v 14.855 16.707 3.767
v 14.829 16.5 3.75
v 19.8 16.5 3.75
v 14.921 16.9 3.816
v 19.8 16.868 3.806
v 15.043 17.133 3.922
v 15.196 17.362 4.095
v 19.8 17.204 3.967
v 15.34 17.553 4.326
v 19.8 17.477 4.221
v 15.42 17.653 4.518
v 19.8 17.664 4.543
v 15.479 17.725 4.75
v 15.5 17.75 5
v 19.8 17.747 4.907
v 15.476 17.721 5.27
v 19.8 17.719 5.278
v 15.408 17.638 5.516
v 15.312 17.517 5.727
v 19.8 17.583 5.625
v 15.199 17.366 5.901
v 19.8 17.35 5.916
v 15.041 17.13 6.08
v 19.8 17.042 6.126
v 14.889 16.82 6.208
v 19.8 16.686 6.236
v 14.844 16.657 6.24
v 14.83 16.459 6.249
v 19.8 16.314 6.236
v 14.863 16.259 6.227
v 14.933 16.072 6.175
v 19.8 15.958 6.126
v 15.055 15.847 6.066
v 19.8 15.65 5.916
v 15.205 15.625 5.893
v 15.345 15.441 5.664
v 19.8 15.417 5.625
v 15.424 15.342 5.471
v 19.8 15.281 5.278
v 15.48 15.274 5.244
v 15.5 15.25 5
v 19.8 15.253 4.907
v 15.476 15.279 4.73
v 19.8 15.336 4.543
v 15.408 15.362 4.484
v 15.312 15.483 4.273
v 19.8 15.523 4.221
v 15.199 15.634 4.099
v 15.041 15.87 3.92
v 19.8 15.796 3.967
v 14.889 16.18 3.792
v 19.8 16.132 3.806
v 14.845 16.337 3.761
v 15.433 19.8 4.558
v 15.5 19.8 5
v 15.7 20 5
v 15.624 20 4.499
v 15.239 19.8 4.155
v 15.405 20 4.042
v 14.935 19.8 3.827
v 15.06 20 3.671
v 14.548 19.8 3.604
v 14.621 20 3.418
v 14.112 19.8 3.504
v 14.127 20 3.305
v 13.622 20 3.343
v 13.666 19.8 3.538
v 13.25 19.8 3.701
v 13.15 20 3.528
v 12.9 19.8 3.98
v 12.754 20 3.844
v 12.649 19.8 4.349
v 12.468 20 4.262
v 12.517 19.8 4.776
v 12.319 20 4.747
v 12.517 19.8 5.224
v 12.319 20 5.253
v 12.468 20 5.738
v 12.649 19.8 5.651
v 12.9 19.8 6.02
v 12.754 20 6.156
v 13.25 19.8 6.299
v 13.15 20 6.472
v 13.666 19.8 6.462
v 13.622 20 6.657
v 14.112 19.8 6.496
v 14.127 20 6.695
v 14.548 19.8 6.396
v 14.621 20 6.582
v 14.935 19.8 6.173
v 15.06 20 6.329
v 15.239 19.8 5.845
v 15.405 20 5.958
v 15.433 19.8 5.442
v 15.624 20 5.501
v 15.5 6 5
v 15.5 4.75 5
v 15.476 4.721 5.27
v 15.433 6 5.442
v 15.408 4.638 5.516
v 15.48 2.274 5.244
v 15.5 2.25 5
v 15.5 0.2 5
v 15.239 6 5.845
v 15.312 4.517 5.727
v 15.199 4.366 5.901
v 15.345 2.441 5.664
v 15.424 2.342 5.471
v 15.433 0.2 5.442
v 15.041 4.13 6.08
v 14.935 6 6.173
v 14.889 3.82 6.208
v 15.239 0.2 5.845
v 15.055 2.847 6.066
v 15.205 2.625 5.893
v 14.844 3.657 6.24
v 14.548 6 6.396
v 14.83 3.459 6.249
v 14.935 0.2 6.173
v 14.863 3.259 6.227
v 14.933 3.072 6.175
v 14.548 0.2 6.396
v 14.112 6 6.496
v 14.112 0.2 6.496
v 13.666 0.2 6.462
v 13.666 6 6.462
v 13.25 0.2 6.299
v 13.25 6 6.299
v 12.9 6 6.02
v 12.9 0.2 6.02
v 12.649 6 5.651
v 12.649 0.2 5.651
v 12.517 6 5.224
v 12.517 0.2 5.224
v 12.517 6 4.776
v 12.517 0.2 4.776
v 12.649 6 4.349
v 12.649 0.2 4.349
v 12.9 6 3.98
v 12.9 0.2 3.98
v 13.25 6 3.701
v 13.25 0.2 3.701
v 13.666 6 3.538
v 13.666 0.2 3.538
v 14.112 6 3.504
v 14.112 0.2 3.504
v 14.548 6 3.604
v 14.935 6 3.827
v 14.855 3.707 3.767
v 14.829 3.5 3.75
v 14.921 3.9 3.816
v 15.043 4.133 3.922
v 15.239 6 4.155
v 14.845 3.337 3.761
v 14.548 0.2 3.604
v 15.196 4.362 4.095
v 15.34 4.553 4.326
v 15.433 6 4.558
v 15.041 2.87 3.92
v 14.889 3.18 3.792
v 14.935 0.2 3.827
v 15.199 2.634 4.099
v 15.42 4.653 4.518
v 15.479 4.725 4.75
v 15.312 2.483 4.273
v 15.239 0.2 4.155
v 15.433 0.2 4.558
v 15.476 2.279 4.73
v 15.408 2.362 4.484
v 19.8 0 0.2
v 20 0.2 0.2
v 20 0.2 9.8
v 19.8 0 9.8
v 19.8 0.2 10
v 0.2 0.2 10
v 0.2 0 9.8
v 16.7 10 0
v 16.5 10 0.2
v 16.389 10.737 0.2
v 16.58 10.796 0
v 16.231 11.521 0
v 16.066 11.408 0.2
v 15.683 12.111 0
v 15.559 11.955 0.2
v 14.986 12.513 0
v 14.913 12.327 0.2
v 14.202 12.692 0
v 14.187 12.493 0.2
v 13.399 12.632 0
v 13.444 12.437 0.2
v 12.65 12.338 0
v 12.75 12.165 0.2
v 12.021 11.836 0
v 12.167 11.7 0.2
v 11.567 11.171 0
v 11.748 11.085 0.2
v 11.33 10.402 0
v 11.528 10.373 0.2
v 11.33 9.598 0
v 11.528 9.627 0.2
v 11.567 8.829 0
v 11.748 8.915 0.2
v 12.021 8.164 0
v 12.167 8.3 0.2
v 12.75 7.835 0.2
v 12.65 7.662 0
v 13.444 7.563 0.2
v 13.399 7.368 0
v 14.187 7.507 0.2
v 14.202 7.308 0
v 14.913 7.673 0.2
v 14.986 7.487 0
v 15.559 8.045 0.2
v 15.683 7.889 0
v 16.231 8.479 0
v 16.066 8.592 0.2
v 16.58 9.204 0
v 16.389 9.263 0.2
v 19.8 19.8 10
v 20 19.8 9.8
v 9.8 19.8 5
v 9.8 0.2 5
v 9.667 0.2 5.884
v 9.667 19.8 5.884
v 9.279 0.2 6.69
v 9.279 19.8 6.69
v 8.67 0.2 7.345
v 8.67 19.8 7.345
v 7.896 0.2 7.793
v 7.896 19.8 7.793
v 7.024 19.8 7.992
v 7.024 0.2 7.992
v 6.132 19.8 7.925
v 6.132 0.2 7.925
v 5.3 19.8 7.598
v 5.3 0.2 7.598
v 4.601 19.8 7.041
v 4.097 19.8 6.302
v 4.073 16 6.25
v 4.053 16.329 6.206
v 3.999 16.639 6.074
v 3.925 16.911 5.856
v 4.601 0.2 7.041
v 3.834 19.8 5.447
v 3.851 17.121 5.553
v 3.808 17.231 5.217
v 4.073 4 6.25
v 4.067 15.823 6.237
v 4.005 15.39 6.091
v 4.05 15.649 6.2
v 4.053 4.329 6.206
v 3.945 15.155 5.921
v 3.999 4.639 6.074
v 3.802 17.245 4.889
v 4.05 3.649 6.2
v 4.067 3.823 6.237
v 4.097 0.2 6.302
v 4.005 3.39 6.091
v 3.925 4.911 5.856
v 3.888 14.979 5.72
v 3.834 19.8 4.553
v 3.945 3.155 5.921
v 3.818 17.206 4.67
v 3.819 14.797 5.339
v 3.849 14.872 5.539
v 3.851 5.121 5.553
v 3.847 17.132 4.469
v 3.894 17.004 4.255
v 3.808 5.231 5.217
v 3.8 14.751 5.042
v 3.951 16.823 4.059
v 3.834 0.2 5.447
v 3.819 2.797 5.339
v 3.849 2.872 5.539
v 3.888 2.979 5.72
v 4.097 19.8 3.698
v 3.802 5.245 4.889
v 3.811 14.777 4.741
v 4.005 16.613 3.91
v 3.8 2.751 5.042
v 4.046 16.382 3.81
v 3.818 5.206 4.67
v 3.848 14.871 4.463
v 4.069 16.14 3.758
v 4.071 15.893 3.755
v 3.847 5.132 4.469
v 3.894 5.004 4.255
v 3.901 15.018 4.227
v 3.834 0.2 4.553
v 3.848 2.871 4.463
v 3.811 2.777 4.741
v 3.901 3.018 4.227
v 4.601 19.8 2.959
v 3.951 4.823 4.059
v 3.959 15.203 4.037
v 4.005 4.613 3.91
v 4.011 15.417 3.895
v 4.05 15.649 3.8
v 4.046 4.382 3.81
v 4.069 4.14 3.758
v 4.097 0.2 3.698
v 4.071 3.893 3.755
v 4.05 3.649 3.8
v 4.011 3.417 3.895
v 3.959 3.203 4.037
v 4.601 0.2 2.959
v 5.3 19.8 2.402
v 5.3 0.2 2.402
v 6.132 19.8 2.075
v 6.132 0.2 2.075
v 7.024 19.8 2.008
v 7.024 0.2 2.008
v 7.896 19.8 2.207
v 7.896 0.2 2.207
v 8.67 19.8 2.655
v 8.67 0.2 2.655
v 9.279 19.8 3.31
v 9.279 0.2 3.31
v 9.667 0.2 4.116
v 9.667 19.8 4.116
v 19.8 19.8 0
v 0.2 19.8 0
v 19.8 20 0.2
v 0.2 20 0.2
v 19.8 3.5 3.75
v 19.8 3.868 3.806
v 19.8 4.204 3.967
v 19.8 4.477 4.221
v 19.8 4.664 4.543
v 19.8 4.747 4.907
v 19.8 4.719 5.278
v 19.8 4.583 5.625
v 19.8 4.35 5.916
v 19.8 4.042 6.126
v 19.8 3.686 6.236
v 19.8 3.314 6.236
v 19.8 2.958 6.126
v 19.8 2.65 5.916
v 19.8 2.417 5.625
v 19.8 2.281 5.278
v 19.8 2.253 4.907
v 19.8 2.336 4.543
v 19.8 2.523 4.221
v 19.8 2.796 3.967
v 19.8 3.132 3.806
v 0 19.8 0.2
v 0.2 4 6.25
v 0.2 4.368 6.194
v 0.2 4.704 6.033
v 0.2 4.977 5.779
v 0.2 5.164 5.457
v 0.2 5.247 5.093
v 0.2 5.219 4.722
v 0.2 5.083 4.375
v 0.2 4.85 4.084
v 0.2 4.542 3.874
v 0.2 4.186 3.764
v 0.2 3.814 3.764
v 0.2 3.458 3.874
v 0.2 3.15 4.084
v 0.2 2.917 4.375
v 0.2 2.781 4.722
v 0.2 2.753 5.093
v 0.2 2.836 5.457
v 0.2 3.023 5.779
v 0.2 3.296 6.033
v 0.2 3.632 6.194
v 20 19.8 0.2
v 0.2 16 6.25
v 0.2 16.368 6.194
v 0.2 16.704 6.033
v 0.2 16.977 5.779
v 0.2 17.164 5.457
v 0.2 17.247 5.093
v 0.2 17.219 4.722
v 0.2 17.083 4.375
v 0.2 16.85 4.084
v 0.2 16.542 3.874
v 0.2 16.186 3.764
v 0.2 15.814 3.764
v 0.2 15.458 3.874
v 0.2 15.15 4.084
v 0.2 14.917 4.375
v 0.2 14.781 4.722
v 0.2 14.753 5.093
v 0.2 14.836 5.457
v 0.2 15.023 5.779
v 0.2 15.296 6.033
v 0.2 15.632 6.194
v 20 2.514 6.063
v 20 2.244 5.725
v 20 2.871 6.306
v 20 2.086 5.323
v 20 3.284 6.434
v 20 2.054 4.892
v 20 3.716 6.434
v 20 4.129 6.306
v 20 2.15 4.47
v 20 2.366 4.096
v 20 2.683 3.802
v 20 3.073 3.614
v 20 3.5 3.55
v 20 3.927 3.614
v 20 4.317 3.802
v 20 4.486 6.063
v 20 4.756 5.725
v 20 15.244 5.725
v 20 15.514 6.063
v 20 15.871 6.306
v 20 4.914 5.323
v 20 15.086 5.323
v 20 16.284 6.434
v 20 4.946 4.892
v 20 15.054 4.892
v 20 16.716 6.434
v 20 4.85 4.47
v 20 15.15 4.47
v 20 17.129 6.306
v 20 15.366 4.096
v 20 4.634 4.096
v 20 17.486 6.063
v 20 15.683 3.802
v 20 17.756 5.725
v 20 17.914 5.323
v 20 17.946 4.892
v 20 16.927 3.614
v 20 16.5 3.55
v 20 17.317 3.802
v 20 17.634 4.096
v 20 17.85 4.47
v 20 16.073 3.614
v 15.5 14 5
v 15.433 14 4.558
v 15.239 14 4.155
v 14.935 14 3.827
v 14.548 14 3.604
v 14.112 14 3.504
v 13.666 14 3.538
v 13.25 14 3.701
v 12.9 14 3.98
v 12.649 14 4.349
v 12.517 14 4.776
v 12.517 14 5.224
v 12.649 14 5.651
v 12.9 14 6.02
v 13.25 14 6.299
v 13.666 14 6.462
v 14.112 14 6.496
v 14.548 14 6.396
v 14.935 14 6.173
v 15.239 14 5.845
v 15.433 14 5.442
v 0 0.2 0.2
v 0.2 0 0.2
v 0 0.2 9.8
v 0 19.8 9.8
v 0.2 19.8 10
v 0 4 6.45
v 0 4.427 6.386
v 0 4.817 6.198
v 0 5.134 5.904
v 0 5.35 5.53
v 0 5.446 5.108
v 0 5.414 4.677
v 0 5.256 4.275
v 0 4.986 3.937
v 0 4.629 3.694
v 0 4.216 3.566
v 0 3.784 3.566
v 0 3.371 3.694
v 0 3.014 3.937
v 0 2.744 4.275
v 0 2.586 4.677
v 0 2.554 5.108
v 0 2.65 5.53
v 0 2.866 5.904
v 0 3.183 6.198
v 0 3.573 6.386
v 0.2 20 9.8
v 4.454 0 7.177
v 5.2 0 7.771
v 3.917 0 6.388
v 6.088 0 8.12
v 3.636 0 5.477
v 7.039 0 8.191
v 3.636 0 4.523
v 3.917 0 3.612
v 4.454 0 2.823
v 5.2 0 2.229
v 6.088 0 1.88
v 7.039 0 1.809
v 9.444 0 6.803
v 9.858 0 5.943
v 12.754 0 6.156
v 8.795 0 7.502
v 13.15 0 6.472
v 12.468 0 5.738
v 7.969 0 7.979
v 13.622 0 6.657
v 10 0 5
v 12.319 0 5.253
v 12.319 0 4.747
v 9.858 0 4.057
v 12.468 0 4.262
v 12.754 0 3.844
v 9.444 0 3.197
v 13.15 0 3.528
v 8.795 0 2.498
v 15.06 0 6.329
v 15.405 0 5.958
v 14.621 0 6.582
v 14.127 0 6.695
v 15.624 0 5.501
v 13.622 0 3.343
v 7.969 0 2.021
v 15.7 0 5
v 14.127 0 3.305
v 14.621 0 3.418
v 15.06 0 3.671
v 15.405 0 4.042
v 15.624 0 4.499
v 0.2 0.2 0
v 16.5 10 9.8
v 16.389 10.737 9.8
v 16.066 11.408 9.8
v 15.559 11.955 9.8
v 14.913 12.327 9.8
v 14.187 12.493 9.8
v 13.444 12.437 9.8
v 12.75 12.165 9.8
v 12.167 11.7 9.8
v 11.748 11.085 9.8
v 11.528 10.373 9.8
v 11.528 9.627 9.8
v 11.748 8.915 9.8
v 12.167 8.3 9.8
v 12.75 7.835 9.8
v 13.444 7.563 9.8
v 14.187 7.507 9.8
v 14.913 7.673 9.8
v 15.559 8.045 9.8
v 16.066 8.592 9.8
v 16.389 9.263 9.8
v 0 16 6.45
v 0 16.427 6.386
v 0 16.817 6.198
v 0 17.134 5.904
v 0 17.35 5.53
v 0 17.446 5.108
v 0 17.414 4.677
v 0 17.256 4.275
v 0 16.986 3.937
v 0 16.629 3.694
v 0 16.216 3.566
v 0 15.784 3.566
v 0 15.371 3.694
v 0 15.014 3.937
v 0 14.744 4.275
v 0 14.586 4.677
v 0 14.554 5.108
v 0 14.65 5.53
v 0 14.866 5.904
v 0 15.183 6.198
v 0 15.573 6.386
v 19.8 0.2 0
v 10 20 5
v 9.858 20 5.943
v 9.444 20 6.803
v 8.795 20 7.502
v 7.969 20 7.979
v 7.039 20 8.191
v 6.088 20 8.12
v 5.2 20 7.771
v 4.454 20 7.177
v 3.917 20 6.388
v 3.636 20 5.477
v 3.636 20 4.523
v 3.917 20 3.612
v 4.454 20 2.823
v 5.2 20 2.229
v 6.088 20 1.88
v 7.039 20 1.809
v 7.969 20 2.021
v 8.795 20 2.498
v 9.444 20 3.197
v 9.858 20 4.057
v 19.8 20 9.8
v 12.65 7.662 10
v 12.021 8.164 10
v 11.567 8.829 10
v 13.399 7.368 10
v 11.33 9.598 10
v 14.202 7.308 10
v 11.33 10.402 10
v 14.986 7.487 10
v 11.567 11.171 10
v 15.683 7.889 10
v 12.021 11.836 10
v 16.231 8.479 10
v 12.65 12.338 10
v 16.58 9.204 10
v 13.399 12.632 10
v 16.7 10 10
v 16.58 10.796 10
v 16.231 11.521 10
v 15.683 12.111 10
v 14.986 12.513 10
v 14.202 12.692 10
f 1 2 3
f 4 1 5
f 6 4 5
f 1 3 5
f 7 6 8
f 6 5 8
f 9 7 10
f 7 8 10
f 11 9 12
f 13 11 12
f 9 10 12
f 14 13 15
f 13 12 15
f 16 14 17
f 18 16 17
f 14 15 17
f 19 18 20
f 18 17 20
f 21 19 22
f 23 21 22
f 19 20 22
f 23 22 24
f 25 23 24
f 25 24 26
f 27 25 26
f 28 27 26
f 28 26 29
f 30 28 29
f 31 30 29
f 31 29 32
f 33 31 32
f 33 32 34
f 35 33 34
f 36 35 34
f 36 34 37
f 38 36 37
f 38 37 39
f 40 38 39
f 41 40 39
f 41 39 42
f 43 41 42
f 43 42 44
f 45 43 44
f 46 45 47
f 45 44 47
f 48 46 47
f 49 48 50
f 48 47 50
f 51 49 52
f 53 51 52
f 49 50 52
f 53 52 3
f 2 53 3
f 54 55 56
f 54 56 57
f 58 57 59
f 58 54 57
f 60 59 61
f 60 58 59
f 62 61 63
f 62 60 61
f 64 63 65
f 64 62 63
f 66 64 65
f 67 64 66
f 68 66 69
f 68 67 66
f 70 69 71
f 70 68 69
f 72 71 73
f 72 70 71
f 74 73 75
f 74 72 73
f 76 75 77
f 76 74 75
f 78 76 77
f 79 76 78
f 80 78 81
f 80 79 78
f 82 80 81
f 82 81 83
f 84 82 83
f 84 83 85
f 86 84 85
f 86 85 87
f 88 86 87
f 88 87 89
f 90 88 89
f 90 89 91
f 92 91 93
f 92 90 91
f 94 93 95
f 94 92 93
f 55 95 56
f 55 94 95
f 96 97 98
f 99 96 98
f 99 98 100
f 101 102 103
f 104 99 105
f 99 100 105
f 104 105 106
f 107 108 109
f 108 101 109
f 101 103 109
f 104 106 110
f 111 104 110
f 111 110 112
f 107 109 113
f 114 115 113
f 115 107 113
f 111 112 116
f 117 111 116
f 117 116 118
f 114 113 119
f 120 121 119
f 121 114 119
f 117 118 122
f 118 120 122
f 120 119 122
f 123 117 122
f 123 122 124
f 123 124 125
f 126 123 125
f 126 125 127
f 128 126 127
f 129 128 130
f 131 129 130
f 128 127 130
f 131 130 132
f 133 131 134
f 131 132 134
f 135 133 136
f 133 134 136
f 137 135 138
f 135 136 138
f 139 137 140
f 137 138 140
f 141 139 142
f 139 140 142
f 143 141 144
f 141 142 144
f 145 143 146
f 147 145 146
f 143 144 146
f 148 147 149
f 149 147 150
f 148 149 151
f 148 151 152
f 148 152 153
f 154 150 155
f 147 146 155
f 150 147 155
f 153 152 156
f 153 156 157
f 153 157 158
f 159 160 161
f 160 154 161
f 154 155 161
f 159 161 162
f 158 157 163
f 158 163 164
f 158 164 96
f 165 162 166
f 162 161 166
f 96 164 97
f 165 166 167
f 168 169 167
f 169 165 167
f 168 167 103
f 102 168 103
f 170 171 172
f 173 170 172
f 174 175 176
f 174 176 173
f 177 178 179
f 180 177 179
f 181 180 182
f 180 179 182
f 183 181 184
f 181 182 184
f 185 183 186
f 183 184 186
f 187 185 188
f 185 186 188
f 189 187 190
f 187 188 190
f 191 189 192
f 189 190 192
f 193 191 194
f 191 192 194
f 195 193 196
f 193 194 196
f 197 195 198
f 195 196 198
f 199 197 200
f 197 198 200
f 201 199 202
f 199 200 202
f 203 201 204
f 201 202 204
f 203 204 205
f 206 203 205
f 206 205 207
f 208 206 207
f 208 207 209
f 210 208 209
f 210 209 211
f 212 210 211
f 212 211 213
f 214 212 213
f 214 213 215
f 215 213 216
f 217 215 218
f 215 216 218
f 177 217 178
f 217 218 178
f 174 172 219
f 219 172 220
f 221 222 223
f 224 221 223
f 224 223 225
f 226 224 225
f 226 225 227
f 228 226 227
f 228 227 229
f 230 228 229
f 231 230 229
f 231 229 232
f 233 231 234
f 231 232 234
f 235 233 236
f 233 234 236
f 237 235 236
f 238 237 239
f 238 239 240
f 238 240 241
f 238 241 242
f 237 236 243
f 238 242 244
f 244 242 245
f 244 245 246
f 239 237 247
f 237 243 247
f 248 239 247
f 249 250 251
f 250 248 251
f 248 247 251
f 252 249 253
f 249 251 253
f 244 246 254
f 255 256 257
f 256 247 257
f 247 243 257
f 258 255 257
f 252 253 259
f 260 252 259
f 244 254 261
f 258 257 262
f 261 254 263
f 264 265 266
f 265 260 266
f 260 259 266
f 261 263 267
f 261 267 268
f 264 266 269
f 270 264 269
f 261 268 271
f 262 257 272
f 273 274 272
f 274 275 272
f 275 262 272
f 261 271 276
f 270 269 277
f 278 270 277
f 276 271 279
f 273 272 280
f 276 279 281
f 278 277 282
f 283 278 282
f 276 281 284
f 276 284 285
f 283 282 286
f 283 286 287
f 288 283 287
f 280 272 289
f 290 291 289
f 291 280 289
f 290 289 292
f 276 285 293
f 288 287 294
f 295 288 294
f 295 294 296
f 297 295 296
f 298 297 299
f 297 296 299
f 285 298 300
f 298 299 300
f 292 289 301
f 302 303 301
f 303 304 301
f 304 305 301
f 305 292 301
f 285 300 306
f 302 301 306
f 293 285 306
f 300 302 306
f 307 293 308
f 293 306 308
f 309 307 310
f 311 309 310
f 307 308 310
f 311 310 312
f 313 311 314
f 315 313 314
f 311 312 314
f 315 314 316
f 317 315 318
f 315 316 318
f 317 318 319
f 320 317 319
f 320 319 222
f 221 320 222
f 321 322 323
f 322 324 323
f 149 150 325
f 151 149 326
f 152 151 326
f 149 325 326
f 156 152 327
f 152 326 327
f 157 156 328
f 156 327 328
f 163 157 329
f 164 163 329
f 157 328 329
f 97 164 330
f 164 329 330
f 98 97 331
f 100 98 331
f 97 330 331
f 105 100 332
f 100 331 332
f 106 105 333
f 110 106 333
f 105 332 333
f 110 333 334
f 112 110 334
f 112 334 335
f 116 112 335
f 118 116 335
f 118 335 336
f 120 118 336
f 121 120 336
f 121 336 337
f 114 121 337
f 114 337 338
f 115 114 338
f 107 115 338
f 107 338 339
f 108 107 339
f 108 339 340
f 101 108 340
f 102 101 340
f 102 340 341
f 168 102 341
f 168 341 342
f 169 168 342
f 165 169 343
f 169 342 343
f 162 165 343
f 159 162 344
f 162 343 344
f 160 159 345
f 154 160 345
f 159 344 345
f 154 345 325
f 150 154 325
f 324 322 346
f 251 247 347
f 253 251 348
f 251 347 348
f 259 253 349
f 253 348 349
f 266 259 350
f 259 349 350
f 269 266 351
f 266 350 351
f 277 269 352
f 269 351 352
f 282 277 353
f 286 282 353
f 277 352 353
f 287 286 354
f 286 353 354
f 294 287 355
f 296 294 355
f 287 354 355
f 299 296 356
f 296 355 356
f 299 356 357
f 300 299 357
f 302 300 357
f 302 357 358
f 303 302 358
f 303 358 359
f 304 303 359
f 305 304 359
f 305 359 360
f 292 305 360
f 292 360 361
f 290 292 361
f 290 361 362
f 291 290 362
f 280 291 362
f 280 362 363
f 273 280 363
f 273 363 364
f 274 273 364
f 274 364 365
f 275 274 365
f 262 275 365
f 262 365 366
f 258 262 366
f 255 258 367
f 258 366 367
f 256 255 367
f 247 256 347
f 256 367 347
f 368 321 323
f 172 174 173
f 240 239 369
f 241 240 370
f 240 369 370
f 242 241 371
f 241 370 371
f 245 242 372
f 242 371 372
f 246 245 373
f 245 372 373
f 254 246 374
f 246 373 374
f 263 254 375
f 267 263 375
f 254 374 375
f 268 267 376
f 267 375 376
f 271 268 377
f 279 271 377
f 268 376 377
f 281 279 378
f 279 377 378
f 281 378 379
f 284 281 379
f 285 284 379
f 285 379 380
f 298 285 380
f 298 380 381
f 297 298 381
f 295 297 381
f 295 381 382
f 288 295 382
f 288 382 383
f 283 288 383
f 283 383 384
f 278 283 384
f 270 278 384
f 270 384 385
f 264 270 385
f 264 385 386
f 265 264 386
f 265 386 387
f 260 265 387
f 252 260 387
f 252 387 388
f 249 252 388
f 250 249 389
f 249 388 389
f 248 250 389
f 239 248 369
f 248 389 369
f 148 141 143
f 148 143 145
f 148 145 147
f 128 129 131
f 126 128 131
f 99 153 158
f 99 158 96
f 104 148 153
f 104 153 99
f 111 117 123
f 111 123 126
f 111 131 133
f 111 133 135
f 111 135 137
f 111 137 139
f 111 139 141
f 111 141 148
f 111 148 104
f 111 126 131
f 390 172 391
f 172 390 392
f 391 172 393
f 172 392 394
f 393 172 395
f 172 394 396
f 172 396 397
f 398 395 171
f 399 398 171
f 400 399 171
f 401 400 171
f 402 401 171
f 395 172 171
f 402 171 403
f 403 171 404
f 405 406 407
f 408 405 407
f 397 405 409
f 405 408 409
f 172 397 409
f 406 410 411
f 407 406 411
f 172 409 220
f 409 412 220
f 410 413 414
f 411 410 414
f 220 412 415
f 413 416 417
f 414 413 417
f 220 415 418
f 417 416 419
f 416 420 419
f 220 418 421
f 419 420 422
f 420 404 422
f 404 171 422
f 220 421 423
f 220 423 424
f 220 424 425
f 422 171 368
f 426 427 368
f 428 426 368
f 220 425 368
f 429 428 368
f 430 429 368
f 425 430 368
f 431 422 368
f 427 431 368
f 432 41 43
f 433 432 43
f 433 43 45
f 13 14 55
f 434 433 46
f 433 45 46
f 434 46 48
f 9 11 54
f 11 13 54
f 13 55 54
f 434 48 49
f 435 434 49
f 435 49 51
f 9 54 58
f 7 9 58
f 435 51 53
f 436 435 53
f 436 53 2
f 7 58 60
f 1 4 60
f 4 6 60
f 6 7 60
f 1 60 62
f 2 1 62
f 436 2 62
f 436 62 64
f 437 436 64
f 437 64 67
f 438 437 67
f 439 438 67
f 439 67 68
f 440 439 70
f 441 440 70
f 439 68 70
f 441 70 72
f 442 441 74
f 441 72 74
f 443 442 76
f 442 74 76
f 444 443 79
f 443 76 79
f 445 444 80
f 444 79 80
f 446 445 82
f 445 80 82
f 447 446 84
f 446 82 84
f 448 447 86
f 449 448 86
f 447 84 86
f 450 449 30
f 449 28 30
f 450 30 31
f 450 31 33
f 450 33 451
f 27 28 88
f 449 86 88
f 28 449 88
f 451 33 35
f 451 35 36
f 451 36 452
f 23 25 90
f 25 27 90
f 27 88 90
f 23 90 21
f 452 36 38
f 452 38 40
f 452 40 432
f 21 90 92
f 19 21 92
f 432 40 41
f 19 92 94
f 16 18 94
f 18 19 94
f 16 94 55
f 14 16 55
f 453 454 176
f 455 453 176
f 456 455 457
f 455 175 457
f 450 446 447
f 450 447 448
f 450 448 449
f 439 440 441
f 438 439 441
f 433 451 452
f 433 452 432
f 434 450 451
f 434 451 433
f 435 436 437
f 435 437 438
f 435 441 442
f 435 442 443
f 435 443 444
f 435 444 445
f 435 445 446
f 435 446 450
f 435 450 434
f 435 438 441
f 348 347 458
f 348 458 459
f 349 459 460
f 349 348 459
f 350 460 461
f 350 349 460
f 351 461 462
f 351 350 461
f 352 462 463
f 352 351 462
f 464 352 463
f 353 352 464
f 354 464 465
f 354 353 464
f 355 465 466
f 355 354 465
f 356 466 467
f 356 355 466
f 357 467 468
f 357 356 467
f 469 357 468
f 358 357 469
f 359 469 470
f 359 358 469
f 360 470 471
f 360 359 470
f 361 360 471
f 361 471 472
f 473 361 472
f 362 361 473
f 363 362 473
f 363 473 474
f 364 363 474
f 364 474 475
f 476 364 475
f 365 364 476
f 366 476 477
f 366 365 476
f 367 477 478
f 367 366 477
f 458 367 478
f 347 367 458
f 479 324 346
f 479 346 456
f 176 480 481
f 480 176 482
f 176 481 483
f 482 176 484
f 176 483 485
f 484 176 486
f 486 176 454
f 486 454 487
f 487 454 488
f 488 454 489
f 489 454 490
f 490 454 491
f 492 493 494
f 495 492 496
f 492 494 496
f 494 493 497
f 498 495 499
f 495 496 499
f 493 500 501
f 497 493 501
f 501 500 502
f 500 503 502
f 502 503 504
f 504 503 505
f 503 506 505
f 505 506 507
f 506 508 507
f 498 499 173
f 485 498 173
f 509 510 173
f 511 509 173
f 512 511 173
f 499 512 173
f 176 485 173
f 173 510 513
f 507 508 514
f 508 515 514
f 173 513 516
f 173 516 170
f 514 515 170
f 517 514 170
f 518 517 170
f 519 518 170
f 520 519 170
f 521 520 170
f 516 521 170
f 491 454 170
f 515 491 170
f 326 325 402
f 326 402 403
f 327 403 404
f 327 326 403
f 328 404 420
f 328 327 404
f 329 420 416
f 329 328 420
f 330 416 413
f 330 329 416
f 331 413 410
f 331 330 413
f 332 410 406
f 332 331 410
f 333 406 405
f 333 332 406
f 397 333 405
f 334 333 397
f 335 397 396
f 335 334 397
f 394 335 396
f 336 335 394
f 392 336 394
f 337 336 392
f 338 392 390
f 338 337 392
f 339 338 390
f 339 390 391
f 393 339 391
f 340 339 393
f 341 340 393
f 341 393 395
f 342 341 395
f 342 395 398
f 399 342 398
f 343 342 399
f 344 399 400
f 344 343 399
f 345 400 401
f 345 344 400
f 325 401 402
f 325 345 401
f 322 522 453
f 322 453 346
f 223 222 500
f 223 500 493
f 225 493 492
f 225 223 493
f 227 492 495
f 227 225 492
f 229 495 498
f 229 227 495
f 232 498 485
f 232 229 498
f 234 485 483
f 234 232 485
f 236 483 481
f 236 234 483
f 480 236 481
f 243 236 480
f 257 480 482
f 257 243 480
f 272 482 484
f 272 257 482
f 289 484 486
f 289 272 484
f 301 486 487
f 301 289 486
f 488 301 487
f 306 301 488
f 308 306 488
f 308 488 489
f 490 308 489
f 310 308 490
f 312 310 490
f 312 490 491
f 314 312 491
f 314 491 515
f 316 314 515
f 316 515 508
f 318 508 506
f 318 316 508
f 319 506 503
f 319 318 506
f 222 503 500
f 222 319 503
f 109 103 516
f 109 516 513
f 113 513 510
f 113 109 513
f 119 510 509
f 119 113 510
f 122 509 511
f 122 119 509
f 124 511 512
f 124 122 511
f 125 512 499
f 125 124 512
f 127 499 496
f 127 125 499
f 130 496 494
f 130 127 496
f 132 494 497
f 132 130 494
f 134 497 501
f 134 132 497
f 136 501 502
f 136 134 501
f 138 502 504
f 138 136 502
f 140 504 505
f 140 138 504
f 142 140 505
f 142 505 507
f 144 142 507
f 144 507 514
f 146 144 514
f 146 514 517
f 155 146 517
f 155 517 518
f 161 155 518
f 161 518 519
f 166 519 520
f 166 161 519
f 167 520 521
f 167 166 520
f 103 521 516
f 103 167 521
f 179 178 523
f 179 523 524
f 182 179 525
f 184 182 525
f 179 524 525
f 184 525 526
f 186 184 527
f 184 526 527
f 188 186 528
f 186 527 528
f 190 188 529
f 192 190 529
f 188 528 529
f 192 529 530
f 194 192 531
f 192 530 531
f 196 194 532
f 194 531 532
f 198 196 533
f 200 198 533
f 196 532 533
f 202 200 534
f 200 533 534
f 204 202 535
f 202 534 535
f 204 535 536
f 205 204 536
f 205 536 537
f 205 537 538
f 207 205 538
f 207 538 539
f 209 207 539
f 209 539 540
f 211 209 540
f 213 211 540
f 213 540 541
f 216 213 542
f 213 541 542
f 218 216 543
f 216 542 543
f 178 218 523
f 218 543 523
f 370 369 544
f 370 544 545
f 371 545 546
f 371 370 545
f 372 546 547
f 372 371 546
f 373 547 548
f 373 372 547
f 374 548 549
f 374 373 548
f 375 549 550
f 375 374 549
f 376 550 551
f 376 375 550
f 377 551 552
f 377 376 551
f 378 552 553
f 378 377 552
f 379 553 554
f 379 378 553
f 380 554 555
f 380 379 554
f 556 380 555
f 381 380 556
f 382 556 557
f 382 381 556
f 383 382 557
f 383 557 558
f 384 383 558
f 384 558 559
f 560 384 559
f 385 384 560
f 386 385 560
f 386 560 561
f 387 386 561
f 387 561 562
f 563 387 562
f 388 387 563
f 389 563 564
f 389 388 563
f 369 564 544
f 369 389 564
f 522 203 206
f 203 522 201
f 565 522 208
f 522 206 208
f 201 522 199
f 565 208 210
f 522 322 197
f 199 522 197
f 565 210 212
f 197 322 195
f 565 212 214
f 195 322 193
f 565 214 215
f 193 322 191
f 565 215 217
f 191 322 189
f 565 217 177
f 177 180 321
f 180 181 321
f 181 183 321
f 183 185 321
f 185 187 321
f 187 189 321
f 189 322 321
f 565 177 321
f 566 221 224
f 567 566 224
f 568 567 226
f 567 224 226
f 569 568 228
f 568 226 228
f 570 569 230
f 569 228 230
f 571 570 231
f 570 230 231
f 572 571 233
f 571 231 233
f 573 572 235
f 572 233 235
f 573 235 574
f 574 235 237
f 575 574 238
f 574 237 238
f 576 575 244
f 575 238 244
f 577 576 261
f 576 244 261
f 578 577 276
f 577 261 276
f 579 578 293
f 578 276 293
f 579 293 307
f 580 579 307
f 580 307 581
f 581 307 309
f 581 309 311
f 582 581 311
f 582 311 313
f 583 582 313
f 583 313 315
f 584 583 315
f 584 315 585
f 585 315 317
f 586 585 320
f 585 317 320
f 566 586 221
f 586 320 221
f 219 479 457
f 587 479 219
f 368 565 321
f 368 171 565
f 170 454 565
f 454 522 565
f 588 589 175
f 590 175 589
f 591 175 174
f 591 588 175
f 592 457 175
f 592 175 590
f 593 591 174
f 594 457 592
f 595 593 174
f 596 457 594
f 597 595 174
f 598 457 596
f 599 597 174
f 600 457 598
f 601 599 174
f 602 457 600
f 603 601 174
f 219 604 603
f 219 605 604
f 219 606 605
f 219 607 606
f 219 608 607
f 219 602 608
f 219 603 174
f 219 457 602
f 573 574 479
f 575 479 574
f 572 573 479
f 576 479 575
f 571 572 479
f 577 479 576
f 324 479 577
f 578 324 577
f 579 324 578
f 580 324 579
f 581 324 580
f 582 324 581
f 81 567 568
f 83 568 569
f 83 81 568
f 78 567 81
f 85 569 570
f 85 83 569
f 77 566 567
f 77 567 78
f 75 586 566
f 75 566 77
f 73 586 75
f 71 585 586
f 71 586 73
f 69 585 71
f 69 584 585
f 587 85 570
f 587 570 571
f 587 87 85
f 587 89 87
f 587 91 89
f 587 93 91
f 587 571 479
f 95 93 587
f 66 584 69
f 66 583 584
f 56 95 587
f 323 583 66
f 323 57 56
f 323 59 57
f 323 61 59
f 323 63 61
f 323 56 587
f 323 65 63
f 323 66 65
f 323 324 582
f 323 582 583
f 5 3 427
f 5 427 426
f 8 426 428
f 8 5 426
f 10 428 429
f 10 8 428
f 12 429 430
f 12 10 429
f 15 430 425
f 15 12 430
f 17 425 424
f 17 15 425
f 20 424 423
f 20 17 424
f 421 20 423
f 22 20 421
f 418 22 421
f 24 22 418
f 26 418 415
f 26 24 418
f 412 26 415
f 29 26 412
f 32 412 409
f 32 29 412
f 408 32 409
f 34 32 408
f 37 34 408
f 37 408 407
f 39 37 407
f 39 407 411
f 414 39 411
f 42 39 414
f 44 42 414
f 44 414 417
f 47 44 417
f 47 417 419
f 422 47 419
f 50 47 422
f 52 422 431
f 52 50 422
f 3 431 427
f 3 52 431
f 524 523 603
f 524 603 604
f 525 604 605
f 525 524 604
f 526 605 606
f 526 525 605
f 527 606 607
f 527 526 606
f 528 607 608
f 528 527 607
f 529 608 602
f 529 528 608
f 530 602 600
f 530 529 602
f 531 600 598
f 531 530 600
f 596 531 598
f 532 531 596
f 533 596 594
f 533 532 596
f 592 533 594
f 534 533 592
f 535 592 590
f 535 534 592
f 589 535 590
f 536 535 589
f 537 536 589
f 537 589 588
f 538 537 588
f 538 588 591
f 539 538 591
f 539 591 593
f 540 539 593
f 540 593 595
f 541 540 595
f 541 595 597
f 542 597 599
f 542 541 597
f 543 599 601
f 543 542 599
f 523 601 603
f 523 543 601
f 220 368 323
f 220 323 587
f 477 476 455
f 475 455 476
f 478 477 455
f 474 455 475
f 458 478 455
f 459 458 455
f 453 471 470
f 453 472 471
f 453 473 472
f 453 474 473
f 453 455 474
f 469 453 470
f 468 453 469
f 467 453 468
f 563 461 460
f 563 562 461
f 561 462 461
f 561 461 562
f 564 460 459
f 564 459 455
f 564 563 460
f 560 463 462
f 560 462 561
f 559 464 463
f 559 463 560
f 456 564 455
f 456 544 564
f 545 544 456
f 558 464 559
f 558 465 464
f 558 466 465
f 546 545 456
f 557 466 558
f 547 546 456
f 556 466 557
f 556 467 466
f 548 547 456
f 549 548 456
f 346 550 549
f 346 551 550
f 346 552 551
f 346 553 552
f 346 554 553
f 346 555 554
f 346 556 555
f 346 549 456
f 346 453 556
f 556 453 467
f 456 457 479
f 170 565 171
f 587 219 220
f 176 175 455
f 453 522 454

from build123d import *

# Parameters (mm, degrees)
SKETCH_1_W          = 20
SKETCH_1_H          = 20
EXTRUDE_1_DEPTH     = 10
SKETCH_2_R          = 2.5
CUT_EXTRUDE_1_DEPTH = 10
SKETCH_3_R          = 3
CUT_EXTRUDE_2_DEPTH = 20
SKETCH_4_R          = 1.25
CUT_EXTRUDE_3_DEPTH = 6.7
SKETCH_5_R          = 1.5
CUT_EXTRUDE_4_DEPTH = 6
SKETCH_6_R          = 1.5
CUT_EXTRUDE_5_DEPTH = 6
SKETCH_7_R          = 1.25
CUT_EXTRUDE_6_DEPTH = 6
CHAMFER_1_SIZE      = 0.2


with BuildPart() as part:
    # Эскиз1 → Бобышка-Вытянуть1 (new body)
    with BuildSketch(Plane.XY):
        with Locations((10, 10)):
            Rectangle(SKETCH_1_W, SKETCH_1_H)
    extrude(amount=EXTRUDE_1_DEPTH)

    # Эскиз2 → Вырез-Вытянуть1 (cut)
    with BuildSketch(Plane.XY.offset(10)):
        with Locations((14, 10)):
            Circle(SKETCH_2_R)
    extrude(amount=-CUT_EXTRUDE_1_DEPTH, mode=Mode.SUBTRACT)

    # Эскиз3 → Вырез-Вытянуть2 (cut)
    with BuildSketch(Plane.XZ):
        with Locations((6.8, 5)):
            Circle(SKETCH_3_R)
    extrude(amount=-CUT_EXTRUDE_2_DEPTH, mode=Mode.SUBTRACT)

    # Эскиз4 → Вырез-Вытянуть3 (cut)
    with BuildSketch(Plane.ZY):
        with Locations((5, 16)):
            Circle(SKETCH_4_R)
        with Locations((5, 4)):
            Circle(SKETCH_4_R)
    extrude(amount=-CUT_EXTRUDE_3_DEPTH, mode=Mode.SUBTRACT)

    # Эскиз5 → Вырез-Вытянуть4 (cut)
    with BuildSketch(Plane.XZ):
        with Locations((14, 5)):
            Circle(SKETCH_5_R)
    extrude(amount=-CUT_EXTRUDE_4_DEPTH, mode=Mode.SUBTRACT)

    # Эскиз6 → Вырез-Вытянуть5 (cut)
    with BuildSketch(Plane(origin=(0, 20, 0), x_dir=(1, 0, 0), z_dir=(0, 1, 0))):
        with Locations((14, -5)):
            Circle(SKETCH_6_R)
    extrude(amount=-CUT_EXTRUDE_5_DEPTH, mode=Mode.SUBTRACT)

    # Эскиз7 → Вырез-Вытянуть6 (cut)
    with BuildSketch(Plane(origin=(20, 0, 0), x_dir=(0, 0, -1), z_dir=(1, 0, 0))):
        with Locations((-5, 3.5)):
            Circle(SKETCH_7_R)
        with Locations((-5, 16.5)):
            Circle(SKETCH_7_R)
    extrude(amount=-CUT_EXTRUDE_6_DEPTH, mode=Mode.SUBTRACT)

    # Фаска1
    chamfer_1_edges = [part.edges().sort_by_distance(p)[0] for p in [
        (20, 10, 10),
        (10, 20, 10),
        (11.5, 10, 0),
        (11.5, 10, 10),
        (3.8, 20, 5),
        (3.8, 0, 5),
        (0, 16, 3.75),
        (0, 4, 3.75),
        (12.5, 0, 5),
        (12.5, 20, 5),
        (0, 10, 10),
        (20, 3.5, 6.25),
        (10, 20, 0),
        (20, 10, 0),
        (20, 16.5, 6.25),
        (10, 0, 0),
        (0, 10, 0),
        (10, 0, 10),
        (0, 20, 5),
        (20, 20, 5),
        (20, 0, 5),
        (0, 0, 5),
    ]]
    chamfer(chamfer_1_edges, length=CHAMFER_1_SIZE)


solid = part.part
